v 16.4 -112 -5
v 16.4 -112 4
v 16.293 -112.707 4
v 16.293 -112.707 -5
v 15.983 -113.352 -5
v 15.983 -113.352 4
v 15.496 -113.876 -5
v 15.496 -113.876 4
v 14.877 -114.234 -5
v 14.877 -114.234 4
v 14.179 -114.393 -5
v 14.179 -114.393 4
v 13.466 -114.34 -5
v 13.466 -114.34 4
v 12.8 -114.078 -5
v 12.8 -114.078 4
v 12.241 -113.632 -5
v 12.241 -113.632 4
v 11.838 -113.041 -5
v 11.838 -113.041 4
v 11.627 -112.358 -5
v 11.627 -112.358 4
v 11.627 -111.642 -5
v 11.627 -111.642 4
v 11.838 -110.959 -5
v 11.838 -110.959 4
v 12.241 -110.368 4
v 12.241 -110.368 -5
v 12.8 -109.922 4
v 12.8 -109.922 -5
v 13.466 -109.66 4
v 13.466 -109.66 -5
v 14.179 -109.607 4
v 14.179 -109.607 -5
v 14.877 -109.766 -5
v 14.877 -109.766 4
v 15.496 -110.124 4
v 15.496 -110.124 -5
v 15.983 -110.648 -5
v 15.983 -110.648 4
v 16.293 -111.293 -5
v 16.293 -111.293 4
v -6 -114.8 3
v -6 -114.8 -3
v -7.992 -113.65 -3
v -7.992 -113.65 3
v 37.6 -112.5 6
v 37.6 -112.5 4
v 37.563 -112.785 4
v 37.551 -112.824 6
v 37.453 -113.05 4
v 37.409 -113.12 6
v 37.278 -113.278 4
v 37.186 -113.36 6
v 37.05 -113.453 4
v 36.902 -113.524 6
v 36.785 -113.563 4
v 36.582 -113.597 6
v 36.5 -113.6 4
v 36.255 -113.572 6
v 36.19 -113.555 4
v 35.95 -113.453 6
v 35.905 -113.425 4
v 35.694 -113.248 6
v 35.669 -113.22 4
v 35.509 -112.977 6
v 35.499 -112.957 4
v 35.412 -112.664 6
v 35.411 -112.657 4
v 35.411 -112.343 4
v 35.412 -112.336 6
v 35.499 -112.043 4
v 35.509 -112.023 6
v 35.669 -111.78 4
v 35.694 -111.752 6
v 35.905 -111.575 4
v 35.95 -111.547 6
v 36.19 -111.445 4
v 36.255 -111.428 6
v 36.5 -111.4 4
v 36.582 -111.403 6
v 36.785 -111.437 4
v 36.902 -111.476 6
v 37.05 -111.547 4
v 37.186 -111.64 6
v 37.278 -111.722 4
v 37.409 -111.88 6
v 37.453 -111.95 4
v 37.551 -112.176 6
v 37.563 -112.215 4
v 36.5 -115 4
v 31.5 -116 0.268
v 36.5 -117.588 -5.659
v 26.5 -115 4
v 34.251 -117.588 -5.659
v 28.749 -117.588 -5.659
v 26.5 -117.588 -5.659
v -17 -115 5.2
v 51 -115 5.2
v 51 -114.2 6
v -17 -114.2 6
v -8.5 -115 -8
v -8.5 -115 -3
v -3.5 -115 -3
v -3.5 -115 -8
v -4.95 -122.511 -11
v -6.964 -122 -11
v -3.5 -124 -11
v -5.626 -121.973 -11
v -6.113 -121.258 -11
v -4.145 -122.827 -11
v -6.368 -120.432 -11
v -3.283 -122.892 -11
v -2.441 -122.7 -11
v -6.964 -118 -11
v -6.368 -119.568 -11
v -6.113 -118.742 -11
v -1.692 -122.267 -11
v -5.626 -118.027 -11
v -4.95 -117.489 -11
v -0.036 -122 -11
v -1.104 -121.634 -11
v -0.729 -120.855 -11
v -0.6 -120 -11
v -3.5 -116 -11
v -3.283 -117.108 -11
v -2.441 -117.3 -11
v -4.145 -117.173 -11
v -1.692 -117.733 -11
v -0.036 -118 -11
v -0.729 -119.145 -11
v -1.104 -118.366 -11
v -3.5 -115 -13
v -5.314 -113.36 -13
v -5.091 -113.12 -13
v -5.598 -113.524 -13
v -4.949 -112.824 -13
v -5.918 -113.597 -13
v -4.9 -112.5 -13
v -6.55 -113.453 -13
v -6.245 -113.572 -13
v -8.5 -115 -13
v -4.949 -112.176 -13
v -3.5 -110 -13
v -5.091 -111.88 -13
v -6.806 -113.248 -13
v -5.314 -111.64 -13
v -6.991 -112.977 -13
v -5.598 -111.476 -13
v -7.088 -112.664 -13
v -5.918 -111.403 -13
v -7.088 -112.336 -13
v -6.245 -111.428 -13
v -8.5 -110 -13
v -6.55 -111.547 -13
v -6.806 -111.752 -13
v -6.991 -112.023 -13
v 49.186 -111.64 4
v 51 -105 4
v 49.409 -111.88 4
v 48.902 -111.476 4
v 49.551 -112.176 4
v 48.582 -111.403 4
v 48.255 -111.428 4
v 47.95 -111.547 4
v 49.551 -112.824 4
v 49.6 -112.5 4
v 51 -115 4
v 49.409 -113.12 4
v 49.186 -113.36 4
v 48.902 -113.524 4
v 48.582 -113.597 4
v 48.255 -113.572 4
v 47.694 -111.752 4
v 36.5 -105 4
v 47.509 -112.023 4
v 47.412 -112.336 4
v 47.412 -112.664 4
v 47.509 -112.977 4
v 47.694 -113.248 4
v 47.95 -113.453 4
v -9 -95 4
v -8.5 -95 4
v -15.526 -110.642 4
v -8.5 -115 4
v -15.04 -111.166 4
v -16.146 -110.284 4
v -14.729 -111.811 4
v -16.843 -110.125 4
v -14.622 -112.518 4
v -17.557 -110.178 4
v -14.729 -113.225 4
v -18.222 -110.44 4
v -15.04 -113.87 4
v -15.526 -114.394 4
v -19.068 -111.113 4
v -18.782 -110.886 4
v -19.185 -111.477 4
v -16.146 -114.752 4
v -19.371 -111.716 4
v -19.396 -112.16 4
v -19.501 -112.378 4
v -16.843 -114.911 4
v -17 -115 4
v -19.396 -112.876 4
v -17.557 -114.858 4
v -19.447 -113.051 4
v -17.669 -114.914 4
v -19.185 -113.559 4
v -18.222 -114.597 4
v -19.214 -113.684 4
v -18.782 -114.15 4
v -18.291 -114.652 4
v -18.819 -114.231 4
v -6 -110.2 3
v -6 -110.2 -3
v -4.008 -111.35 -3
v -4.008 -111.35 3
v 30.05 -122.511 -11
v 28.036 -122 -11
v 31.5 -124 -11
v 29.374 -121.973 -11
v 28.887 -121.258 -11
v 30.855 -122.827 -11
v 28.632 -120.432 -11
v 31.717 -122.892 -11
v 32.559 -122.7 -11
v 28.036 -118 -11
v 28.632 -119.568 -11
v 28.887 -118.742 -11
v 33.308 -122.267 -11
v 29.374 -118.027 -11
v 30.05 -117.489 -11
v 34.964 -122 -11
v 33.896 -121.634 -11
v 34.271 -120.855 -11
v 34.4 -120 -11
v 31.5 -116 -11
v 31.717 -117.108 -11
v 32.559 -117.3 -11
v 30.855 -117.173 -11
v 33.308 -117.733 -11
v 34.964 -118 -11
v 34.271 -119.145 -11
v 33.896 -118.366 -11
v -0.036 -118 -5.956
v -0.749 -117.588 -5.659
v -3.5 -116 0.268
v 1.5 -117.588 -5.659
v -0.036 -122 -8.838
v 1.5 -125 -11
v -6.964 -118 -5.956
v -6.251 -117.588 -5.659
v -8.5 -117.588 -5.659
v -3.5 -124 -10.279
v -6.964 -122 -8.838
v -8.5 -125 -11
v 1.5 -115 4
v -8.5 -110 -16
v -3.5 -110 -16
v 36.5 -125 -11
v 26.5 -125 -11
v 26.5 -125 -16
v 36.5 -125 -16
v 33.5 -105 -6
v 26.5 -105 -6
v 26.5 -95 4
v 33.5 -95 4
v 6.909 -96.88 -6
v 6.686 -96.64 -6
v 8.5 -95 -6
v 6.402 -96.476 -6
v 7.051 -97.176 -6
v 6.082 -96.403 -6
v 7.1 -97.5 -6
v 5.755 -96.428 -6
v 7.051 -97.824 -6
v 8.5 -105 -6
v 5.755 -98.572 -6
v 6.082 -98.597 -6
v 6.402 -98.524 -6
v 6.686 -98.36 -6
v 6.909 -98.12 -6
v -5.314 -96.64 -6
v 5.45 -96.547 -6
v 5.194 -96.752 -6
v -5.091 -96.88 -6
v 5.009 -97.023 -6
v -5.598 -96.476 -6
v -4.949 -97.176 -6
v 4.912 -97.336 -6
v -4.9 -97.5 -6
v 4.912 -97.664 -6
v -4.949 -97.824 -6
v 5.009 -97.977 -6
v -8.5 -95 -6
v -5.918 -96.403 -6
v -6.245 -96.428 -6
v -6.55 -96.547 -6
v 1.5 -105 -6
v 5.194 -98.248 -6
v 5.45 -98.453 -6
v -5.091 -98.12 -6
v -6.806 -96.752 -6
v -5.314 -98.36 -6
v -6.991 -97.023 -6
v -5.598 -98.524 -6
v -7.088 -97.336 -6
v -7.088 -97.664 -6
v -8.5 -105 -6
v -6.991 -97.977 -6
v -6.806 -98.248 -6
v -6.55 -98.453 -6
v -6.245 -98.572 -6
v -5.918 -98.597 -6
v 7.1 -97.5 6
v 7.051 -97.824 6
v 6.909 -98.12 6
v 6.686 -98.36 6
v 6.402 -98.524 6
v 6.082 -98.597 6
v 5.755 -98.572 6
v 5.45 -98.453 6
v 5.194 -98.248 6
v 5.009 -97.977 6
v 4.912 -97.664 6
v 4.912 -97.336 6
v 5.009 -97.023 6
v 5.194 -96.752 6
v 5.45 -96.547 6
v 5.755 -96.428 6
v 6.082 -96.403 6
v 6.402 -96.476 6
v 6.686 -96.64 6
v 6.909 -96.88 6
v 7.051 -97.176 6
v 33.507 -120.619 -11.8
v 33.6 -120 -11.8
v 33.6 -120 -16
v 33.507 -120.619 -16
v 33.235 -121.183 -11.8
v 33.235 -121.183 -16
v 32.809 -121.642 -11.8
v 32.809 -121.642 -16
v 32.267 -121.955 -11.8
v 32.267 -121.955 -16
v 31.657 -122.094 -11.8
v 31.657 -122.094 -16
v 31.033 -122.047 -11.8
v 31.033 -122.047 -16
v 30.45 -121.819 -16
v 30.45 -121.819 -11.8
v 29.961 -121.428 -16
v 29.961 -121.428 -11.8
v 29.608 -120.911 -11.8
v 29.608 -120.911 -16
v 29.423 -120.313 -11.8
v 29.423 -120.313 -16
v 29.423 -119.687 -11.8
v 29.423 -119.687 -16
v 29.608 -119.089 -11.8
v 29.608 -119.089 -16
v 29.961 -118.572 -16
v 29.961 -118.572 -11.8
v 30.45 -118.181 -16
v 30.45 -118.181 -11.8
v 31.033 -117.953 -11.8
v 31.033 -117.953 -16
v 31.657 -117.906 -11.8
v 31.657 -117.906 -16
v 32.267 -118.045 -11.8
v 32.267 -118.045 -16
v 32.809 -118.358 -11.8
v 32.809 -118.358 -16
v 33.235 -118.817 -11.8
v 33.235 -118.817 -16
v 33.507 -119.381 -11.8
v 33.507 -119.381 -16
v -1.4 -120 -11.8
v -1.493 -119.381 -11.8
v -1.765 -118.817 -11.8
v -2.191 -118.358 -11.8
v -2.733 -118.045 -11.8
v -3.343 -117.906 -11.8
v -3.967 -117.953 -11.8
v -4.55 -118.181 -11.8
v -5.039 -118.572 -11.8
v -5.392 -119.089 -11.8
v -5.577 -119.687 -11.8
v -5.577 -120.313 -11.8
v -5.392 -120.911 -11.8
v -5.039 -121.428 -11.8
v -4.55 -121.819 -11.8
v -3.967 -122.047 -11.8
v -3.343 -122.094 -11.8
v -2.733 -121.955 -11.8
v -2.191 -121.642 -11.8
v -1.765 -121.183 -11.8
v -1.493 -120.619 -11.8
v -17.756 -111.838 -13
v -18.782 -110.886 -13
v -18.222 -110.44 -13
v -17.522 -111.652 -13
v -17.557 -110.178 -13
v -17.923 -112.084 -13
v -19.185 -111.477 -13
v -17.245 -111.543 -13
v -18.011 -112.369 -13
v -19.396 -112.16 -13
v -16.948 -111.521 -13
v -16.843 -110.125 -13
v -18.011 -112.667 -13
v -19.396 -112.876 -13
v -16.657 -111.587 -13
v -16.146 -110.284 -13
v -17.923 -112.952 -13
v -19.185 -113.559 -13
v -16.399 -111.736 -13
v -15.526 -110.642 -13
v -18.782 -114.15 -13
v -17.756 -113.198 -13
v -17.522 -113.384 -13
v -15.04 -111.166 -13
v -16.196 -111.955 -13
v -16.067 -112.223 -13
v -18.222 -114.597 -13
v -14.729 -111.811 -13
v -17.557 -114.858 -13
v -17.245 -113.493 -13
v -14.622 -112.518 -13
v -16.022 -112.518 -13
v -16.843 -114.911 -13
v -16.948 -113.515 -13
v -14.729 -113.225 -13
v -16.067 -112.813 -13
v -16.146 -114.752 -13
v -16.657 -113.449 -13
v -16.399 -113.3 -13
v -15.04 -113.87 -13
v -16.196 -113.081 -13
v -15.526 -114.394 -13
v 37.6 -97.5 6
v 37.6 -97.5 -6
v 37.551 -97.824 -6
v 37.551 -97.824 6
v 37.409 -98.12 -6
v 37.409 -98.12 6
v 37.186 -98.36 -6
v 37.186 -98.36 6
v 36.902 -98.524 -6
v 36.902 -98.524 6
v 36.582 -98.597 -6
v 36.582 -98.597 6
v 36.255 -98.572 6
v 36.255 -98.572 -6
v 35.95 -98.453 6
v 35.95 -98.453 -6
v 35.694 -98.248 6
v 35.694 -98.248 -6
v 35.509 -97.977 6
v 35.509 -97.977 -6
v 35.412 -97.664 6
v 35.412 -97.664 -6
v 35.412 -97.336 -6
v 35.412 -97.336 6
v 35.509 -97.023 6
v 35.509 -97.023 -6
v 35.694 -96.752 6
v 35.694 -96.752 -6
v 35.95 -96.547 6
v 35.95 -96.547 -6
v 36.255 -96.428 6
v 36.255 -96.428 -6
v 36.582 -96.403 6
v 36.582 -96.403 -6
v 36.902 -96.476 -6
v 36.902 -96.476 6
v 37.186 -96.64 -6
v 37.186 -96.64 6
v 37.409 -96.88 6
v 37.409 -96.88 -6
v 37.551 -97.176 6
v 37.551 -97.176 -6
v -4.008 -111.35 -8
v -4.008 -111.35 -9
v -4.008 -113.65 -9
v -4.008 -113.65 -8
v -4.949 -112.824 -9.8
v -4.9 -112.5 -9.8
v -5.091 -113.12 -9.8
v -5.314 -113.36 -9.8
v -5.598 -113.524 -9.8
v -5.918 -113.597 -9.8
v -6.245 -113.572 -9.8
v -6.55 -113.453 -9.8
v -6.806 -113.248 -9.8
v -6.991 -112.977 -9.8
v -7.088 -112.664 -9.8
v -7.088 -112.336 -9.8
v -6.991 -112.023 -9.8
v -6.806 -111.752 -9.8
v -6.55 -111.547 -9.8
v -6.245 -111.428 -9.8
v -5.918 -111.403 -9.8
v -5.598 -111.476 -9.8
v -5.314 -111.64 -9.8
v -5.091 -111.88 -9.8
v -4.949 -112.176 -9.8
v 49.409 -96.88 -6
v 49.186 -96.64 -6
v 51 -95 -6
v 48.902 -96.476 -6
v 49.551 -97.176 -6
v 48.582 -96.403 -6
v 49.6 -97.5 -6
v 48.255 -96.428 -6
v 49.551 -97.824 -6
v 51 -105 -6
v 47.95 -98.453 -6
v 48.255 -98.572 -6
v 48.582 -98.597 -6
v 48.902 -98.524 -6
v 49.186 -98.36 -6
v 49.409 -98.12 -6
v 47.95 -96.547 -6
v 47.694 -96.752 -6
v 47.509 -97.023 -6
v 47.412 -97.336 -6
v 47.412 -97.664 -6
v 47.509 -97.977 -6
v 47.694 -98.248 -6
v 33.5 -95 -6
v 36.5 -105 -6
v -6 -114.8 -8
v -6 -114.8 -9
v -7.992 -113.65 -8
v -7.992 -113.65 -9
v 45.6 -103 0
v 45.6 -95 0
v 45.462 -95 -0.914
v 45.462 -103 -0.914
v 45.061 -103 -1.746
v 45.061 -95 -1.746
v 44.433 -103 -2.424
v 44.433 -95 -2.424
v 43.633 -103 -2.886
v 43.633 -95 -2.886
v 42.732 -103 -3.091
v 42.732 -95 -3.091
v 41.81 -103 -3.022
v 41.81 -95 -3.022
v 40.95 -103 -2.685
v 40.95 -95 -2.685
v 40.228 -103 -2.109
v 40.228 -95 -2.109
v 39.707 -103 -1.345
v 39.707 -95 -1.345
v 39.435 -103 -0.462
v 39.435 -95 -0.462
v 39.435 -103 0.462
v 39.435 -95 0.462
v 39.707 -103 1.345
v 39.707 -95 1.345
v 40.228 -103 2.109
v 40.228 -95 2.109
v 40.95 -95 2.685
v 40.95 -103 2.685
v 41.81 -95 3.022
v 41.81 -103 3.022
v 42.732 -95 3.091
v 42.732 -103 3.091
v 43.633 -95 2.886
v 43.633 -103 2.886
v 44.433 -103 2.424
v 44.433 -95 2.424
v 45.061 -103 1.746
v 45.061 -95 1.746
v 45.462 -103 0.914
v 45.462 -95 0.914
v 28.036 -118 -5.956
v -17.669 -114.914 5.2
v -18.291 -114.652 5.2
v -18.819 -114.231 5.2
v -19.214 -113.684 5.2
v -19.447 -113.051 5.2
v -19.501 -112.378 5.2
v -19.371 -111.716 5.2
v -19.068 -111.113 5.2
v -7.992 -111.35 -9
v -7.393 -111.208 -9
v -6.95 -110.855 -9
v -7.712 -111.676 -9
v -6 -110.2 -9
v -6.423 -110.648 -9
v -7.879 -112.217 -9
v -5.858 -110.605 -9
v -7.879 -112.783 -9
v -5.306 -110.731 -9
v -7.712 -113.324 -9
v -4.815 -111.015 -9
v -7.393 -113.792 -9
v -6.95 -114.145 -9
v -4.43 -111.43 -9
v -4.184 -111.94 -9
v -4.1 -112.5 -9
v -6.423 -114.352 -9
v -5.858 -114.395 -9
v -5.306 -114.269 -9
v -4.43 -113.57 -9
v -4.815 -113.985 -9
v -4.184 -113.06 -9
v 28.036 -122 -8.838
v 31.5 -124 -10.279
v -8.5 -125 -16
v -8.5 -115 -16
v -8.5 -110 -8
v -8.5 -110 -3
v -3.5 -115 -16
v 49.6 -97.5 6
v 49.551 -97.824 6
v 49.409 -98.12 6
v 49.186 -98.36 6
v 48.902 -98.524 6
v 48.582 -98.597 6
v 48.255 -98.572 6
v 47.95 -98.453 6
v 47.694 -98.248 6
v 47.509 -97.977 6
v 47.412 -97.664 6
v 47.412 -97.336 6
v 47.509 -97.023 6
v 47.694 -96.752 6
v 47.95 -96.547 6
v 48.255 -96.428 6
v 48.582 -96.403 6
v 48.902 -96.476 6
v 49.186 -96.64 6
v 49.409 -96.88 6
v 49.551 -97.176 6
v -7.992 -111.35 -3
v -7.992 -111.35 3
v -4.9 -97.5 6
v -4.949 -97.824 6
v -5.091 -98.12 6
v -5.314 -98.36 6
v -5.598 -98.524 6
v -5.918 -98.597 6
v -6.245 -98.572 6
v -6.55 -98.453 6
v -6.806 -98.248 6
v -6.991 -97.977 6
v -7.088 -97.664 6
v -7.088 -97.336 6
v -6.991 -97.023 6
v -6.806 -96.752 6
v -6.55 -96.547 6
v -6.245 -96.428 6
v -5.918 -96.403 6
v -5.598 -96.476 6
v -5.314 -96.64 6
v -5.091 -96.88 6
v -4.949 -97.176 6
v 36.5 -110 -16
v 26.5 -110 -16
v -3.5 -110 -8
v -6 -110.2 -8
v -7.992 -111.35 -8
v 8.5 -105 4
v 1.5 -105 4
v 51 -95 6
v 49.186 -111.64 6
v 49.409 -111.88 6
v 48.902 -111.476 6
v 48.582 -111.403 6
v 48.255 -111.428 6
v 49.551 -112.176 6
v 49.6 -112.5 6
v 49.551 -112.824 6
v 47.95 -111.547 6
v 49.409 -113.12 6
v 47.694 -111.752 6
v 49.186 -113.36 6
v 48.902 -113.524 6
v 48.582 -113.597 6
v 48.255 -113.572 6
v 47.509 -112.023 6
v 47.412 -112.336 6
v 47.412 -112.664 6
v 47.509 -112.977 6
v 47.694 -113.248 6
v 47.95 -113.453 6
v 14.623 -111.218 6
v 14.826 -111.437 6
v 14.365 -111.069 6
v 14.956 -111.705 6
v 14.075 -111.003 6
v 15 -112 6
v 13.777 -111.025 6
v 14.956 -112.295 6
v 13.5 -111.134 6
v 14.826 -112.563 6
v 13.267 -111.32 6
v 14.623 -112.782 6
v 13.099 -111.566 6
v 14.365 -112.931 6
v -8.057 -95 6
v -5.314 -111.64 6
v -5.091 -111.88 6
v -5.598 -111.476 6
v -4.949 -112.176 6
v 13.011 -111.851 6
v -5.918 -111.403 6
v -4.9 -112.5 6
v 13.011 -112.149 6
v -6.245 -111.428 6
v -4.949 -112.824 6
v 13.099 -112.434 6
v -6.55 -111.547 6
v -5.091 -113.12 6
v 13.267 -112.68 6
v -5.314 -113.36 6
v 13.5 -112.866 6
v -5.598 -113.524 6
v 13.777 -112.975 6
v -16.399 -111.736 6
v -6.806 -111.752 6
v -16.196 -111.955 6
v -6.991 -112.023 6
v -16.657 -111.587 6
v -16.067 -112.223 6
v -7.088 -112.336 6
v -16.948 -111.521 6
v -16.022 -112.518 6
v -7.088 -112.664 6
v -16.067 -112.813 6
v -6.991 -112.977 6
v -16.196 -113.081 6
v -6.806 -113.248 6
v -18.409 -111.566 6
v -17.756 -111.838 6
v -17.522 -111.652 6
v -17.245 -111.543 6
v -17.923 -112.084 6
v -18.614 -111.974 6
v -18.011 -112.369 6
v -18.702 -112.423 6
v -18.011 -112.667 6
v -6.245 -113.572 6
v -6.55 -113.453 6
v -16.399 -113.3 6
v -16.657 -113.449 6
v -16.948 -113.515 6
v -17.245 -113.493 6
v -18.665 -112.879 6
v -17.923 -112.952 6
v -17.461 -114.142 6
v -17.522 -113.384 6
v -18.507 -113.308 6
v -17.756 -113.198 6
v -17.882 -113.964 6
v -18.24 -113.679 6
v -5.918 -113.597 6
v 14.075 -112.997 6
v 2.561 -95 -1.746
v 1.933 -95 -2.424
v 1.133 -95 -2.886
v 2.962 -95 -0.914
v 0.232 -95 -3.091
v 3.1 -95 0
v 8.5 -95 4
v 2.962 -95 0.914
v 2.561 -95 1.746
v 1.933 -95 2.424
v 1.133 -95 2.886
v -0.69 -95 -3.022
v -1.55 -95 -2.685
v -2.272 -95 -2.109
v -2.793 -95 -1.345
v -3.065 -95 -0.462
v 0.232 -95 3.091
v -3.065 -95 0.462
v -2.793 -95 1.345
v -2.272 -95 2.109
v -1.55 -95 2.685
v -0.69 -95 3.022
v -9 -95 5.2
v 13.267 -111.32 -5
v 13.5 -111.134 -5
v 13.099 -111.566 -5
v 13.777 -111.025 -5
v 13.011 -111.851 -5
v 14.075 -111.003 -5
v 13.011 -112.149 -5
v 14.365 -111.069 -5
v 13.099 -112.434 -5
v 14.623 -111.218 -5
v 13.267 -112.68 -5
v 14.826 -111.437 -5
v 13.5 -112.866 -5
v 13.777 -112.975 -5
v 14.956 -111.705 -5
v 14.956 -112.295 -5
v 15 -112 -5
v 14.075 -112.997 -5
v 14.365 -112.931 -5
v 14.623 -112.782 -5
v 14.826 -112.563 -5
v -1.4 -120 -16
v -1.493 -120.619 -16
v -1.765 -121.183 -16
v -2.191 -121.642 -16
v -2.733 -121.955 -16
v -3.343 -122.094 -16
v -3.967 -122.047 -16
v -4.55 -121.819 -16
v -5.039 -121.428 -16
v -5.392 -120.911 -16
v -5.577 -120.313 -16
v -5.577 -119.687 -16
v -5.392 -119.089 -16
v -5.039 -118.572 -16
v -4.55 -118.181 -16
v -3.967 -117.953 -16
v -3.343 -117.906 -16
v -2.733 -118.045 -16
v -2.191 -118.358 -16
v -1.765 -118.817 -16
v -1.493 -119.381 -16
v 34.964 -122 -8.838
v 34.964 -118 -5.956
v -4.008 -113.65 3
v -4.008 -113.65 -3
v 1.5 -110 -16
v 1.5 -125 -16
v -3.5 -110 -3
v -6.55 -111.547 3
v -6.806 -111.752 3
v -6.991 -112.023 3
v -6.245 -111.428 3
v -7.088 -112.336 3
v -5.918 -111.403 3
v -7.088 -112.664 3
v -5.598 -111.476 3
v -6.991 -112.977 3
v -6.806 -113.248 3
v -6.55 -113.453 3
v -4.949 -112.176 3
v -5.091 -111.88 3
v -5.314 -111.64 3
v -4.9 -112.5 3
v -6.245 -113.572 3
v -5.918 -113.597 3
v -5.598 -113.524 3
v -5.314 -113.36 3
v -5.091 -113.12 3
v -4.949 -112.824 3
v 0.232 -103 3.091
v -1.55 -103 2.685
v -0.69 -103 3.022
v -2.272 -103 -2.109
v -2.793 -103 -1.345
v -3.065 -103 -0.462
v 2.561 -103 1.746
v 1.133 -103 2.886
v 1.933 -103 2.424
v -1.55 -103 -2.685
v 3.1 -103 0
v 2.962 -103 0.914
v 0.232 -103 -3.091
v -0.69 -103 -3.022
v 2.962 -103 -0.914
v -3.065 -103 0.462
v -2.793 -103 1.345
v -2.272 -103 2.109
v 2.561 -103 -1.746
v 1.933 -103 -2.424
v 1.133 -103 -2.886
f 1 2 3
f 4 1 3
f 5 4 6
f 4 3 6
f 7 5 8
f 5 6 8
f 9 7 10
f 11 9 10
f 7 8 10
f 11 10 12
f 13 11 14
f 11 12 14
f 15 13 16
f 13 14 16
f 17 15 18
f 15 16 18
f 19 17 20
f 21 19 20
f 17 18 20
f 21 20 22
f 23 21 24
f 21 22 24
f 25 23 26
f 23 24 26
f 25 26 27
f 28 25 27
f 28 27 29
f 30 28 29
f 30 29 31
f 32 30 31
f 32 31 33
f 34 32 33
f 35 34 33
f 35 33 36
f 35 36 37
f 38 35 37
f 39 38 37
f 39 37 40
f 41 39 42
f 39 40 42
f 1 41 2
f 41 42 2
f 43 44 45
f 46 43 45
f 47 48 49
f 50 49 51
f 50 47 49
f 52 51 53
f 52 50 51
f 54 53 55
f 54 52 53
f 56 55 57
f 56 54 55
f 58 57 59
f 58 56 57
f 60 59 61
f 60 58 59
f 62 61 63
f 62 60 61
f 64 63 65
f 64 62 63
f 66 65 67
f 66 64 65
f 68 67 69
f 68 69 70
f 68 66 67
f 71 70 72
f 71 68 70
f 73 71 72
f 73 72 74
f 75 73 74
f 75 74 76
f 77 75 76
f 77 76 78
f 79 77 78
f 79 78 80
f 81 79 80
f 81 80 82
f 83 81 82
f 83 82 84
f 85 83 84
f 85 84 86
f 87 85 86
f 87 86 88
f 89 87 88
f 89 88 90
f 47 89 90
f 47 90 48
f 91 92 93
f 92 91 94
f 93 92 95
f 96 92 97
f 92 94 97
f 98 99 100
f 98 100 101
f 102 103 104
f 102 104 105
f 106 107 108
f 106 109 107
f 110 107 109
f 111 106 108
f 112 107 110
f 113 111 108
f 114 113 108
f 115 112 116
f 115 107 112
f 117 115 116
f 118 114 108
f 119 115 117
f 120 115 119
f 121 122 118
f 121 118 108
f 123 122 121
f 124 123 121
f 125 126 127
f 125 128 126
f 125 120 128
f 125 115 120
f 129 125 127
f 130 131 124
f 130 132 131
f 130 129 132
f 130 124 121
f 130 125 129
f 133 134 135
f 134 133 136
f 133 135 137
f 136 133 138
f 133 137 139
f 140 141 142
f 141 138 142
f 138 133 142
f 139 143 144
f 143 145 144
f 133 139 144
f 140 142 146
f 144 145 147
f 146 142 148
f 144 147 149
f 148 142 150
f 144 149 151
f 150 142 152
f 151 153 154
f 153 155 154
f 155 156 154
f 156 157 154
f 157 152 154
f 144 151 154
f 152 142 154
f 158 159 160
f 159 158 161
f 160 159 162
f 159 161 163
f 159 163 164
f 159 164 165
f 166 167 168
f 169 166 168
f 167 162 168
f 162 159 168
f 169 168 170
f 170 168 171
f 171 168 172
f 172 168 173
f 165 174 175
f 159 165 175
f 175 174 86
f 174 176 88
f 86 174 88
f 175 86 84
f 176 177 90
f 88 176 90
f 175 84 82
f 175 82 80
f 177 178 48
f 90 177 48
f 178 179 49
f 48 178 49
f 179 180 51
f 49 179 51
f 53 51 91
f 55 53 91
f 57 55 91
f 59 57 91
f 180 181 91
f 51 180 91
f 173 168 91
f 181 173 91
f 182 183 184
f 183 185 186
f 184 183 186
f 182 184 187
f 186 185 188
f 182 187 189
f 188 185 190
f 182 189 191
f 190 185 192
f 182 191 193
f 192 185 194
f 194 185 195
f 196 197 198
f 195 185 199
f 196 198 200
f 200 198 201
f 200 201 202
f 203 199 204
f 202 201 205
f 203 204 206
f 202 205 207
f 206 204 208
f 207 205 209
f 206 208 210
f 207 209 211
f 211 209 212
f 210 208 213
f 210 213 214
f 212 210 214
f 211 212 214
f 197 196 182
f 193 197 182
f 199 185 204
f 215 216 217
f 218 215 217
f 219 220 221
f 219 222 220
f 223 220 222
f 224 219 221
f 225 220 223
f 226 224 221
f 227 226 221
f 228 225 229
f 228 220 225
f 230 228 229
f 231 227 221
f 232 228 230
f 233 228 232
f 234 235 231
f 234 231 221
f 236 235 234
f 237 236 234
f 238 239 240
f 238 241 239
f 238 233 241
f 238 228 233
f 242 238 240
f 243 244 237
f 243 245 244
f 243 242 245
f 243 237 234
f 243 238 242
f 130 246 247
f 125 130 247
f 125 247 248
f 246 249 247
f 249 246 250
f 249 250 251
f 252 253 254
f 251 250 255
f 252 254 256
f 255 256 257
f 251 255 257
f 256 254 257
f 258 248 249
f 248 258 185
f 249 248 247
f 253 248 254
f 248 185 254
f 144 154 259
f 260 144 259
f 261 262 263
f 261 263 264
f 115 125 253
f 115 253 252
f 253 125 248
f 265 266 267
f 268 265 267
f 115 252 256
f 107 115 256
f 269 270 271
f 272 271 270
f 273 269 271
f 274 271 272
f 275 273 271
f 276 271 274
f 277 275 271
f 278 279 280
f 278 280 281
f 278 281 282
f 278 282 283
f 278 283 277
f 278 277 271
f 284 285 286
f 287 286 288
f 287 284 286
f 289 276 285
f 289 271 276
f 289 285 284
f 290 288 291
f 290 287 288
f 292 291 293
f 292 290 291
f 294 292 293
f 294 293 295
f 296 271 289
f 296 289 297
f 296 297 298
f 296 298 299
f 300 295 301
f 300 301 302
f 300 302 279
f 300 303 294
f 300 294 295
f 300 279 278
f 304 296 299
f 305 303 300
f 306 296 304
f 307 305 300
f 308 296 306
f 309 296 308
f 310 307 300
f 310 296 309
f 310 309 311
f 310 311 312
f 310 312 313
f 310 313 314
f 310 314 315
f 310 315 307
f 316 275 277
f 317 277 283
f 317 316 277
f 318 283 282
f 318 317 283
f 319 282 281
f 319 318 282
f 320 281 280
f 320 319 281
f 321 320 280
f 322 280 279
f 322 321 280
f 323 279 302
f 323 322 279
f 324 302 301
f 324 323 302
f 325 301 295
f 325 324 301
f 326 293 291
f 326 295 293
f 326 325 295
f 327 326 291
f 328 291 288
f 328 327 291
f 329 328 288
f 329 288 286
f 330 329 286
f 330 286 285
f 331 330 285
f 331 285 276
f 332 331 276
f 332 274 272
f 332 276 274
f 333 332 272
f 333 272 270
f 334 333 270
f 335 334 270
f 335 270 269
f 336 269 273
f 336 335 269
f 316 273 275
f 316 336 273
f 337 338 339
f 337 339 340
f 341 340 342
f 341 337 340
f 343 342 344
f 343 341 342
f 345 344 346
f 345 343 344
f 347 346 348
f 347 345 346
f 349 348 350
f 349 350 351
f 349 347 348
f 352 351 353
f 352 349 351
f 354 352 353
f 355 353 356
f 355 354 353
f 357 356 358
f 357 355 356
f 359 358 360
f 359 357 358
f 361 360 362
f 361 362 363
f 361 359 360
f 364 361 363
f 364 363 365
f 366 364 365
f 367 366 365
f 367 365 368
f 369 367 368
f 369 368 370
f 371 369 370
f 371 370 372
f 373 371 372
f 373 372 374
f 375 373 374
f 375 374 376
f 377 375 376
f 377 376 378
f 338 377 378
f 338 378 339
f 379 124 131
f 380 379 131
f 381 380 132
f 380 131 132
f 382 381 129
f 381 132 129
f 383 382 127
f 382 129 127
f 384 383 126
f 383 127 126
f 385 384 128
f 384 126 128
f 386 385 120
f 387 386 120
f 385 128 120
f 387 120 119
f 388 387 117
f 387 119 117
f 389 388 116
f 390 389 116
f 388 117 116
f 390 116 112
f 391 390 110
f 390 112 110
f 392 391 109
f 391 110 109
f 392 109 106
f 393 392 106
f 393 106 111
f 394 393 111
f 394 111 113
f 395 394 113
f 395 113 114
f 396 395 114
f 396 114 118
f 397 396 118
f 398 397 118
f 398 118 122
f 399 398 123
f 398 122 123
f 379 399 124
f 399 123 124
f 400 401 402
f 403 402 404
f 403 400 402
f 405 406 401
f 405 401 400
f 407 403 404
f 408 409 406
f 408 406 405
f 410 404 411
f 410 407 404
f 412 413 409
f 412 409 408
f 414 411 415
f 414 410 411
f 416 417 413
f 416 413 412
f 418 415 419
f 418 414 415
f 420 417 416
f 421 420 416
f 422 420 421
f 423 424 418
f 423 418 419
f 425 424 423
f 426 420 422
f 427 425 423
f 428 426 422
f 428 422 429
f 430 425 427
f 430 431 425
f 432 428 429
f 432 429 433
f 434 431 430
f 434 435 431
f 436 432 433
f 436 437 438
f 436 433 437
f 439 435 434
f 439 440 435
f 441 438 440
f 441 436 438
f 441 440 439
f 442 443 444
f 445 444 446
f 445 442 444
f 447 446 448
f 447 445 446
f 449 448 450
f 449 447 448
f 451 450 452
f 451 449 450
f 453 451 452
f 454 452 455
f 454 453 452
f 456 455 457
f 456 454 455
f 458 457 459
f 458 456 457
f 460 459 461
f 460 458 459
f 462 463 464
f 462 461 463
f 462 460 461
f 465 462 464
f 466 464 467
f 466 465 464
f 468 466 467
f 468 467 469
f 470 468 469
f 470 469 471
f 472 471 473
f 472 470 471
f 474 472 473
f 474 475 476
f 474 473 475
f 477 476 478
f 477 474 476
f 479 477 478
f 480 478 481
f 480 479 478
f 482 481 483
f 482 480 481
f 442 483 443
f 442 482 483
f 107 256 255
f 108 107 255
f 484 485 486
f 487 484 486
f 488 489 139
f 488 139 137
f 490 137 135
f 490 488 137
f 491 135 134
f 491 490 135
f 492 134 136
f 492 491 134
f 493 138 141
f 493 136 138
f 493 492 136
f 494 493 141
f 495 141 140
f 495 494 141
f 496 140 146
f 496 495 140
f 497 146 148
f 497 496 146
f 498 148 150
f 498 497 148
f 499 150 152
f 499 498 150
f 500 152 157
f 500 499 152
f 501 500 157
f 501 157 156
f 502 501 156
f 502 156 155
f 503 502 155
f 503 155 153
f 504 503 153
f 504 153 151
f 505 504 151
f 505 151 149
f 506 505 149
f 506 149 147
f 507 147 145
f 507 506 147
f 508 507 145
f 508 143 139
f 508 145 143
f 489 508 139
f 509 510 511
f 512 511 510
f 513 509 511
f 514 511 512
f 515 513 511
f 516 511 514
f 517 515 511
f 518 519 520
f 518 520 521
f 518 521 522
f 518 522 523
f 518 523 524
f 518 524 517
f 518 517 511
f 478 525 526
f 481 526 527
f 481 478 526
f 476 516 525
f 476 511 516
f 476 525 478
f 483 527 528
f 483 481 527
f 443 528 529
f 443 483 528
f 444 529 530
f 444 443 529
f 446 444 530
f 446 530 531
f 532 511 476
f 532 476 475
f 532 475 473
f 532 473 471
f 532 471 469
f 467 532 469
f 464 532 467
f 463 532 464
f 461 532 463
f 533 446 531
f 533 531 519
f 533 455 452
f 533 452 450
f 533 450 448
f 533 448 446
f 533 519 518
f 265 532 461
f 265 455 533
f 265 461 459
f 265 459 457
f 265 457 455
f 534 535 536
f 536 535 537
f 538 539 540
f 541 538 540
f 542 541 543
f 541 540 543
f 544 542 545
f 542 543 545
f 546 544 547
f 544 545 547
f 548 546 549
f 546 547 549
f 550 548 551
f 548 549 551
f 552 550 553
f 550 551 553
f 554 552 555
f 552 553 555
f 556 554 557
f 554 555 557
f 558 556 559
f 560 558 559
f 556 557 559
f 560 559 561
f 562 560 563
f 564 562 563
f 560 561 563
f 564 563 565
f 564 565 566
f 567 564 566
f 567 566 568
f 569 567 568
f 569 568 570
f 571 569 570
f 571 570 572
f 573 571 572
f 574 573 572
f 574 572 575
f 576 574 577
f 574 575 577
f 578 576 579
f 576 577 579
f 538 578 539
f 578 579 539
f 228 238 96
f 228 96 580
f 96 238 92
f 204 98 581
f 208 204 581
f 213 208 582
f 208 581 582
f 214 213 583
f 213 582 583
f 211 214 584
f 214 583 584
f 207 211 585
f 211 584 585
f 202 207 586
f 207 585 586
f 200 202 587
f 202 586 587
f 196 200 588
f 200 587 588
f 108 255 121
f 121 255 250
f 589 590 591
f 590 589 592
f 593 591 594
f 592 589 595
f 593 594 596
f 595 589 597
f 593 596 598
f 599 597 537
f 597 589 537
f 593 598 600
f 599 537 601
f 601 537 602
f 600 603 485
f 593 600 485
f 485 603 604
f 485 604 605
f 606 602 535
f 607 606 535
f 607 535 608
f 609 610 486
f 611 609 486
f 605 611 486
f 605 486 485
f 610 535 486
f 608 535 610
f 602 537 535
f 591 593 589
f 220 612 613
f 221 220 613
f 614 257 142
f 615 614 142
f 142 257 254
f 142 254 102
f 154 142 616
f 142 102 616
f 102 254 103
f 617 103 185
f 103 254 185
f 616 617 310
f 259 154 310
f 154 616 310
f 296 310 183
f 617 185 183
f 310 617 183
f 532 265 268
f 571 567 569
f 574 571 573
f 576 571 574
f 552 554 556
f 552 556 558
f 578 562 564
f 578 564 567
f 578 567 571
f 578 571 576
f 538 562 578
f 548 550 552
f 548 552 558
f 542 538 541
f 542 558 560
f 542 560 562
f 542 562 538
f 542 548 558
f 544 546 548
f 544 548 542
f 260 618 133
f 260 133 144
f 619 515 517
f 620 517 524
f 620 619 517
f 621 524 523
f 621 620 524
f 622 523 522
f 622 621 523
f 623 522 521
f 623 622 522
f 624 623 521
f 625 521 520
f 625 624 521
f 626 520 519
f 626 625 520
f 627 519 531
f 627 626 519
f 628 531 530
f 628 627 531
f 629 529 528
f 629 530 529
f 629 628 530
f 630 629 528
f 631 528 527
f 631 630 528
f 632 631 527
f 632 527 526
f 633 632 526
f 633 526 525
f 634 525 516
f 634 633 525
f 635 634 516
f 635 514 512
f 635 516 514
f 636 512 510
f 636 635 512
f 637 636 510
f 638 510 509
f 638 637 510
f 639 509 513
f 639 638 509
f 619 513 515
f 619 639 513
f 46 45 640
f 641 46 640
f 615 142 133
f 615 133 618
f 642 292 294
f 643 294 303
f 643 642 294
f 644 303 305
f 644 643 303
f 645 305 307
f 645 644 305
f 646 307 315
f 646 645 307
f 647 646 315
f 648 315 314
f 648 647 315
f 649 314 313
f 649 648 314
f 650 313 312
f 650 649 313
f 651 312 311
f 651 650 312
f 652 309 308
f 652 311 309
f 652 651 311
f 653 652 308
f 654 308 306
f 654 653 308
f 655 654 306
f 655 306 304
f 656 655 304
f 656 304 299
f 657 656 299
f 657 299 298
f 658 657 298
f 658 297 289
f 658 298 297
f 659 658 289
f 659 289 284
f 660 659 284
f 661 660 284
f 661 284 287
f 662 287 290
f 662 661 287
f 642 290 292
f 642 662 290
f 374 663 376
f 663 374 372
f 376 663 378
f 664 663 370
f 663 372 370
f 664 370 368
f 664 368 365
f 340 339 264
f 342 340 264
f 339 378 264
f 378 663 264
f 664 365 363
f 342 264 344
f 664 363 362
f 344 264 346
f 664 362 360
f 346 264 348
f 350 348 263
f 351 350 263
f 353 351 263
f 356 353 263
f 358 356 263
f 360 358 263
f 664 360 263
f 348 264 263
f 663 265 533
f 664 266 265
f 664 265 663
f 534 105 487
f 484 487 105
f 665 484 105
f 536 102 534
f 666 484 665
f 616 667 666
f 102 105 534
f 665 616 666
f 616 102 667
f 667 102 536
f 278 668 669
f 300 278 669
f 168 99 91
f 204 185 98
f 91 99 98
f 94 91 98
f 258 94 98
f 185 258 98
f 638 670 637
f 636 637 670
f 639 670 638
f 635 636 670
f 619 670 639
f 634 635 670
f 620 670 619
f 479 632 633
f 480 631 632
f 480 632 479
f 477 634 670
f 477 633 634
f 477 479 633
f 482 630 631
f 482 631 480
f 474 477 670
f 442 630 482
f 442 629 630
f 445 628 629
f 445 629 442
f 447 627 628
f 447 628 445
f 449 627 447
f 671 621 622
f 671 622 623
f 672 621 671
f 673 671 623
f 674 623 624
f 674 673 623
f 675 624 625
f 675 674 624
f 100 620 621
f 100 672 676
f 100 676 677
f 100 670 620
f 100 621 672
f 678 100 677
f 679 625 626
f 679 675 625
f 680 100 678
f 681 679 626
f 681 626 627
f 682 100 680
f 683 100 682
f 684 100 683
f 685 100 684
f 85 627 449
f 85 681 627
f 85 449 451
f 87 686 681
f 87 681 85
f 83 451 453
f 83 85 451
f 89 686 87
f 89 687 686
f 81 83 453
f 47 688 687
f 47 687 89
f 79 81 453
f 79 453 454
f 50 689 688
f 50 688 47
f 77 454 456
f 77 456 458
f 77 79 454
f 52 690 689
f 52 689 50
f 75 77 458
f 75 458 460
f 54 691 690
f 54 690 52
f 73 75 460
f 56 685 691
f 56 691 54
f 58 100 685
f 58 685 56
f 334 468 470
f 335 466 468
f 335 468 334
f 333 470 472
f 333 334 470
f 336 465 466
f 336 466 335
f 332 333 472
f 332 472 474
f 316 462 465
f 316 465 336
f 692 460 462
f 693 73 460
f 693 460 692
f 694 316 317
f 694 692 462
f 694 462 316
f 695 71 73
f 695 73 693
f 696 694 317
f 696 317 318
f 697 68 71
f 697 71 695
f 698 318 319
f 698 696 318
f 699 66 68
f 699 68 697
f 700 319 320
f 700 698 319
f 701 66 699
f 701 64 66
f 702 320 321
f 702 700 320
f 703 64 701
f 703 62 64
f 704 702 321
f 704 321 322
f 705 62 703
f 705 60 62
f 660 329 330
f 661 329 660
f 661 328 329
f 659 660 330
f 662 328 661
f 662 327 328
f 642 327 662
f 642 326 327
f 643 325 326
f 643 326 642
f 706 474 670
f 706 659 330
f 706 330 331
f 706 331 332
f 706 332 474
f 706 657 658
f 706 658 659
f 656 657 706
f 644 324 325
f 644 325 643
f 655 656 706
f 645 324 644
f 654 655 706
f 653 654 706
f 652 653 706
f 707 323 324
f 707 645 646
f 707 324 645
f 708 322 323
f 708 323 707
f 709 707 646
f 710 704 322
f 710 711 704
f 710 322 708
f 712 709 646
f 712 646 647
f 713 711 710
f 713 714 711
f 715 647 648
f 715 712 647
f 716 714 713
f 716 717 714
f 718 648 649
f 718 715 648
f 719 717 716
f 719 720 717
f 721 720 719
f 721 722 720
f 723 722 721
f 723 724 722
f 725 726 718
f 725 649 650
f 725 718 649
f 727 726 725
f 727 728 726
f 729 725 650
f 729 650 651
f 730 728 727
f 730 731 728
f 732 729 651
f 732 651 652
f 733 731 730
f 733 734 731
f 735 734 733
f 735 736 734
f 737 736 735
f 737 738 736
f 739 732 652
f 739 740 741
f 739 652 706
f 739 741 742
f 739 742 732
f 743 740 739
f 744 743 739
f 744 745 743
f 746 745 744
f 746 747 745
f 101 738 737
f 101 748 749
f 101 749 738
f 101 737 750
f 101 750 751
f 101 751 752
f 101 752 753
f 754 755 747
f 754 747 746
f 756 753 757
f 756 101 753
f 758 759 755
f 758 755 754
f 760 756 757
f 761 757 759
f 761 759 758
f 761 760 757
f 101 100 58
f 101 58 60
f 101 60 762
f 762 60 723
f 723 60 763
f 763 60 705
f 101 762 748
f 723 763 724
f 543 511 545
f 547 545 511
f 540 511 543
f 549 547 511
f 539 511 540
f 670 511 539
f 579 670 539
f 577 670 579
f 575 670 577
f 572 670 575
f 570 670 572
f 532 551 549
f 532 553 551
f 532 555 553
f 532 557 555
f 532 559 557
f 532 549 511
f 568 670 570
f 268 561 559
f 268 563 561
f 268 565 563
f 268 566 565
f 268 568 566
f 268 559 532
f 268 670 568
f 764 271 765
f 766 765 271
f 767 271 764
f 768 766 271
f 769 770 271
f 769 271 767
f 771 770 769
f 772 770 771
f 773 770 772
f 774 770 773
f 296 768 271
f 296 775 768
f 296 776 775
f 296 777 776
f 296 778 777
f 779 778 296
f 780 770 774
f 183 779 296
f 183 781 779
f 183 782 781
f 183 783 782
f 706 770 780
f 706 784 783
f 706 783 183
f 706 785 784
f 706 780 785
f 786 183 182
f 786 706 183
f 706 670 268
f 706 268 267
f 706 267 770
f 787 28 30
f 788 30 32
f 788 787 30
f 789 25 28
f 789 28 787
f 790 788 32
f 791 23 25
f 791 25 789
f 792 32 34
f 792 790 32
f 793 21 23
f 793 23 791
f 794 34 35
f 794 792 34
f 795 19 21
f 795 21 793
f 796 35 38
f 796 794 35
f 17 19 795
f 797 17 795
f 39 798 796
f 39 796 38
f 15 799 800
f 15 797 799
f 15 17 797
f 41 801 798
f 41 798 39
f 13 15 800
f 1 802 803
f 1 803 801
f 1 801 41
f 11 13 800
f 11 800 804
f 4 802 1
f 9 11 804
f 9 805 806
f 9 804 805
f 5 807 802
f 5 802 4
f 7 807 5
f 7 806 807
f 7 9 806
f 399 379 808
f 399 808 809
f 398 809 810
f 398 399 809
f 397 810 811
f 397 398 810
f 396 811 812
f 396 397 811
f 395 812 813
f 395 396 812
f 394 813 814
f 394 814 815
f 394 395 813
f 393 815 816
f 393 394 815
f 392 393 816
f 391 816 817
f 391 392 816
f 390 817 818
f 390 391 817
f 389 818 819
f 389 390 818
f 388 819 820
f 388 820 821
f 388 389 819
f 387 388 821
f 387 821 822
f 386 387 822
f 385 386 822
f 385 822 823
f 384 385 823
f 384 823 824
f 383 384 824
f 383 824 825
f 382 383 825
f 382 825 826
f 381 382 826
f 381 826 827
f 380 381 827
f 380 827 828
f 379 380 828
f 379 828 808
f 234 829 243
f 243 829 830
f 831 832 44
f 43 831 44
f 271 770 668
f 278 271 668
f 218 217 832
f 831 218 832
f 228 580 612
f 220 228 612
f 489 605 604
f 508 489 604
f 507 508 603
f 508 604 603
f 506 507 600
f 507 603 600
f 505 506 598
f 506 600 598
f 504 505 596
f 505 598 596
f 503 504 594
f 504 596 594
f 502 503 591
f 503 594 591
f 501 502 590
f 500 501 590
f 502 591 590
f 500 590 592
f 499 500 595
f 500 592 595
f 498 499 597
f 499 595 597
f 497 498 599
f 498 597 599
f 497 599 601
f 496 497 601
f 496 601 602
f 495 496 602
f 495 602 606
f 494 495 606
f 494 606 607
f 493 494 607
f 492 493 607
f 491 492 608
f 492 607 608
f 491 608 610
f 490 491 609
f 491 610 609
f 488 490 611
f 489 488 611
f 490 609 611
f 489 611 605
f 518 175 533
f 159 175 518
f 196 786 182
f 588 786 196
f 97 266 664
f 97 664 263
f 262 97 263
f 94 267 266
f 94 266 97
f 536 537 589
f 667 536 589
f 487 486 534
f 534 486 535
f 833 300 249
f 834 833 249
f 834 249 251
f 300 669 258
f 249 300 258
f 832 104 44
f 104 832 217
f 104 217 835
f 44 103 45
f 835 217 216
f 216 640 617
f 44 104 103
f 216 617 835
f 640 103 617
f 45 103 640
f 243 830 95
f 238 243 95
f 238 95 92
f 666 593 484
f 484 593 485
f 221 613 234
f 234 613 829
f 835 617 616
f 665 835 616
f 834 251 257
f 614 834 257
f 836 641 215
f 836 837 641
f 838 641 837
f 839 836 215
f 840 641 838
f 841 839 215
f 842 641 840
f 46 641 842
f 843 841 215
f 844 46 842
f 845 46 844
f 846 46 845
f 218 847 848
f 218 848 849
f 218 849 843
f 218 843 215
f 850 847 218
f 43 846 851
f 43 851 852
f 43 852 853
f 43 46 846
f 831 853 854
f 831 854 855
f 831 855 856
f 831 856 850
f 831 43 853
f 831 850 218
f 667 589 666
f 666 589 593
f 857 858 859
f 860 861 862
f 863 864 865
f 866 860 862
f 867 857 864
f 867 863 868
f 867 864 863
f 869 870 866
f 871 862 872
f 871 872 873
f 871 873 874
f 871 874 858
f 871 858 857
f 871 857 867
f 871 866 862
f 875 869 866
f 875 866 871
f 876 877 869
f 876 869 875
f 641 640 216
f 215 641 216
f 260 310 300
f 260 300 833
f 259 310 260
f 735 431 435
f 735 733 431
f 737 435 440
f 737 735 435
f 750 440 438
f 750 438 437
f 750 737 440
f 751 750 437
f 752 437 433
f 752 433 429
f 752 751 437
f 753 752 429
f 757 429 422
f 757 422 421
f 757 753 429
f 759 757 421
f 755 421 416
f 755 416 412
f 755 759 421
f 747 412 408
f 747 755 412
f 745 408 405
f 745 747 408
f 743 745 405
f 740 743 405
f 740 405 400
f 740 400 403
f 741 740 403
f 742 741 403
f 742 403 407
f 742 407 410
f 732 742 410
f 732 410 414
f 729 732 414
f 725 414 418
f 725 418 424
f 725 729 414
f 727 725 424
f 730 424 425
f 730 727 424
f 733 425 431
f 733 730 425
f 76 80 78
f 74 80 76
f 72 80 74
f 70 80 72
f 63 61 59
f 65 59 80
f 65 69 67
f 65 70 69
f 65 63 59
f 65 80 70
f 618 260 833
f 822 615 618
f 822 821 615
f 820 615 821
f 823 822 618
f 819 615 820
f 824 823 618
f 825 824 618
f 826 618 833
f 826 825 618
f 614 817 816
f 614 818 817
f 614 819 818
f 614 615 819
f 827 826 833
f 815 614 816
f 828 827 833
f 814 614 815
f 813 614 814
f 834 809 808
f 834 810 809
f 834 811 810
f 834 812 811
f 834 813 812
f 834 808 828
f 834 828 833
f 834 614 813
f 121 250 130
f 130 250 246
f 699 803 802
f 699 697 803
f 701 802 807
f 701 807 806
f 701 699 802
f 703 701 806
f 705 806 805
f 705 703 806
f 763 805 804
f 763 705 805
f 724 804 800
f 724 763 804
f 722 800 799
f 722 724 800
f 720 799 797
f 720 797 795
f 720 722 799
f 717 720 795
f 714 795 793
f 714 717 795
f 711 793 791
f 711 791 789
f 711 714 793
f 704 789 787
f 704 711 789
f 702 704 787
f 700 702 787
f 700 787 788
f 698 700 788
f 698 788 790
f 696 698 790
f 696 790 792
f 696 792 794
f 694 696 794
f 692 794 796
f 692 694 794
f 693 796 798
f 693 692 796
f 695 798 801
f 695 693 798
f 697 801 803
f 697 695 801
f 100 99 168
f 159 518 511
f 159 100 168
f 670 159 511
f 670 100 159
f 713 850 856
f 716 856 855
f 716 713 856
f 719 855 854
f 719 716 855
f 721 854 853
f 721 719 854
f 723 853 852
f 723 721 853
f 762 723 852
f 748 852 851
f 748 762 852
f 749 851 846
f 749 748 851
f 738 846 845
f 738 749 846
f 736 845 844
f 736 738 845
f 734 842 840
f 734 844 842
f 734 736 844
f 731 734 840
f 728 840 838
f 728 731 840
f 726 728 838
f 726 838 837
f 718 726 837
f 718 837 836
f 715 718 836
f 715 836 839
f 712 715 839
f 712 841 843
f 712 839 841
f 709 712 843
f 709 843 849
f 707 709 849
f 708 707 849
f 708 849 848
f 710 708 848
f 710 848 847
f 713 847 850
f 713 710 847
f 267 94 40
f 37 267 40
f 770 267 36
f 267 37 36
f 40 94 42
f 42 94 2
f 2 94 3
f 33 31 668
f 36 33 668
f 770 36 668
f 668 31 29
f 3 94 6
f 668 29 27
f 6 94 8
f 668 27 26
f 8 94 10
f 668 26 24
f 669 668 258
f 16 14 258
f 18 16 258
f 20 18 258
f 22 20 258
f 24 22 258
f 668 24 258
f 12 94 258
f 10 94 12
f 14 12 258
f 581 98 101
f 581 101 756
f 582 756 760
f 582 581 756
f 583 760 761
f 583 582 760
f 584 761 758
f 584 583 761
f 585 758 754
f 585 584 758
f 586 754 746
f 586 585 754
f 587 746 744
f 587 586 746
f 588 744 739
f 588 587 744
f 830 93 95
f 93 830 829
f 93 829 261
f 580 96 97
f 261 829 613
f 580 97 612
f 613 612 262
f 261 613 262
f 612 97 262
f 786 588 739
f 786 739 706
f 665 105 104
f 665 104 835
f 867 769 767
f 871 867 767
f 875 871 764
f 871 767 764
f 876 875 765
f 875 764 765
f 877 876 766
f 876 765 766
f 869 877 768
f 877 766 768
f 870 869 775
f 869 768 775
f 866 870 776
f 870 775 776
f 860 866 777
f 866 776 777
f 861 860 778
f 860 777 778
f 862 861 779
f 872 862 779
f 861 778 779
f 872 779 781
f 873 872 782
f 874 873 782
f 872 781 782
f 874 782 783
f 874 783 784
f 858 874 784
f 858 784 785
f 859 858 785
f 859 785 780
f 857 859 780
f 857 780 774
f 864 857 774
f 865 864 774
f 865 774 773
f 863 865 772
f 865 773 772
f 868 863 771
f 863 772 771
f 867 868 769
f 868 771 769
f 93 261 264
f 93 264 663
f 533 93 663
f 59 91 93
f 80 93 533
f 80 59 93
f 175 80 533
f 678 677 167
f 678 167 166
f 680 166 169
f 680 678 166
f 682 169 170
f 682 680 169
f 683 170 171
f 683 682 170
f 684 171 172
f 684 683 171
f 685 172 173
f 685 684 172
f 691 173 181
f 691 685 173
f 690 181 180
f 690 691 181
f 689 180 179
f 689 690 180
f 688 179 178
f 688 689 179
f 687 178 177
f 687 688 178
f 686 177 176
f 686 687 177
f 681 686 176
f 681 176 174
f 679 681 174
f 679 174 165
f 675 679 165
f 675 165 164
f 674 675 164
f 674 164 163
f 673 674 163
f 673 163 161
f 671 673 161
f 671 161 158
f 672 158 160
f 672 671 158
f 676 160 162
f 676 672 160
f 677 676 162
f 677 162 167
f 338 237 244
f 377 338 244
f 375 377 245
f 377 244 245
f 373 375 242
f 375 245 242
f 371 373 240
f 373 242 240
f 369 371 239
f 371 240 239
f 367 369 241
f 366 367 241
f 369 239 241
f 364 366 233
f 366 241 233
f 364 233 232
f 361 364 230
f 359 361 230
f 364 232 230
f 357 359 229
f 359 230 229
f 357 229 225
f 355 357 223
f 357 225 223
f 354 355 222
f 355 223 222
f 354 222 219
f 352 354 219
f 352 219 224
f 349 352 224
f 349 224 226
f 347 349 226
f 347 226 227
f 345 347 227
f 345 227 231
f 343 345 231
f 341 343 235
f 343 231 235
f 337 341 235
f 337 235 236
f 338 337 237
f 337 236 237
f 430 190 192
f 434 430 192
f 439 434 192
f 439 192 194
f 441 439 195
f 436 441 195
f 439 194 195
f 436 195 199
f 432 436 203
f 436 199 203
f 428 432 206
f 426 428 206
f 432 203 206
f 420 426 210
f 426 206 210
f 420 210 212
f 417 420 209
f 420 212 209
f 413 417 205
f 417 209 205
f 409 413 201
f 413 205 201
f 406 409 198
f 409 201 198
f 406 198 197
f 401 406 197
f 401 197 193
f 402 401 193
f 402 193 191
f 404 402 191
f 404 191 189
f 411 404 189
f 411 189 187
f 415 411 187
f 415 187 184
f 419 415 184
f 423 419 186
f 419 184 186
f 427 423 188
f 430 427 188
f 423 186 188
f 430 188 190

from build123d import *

# Parameters (mm, degrees)
SKETCH062_R     = 1.1
SKETCH062_R_2   = 1
PAD027_DEPTH    = 2
SKETCH063_R     = 2.4
SKETCH063_R_2   = 1
PAD028_DEPTH    = 17
SKETCH064_R     = 2.4
SKETCH064_R_2   = 1
PAD029_DEPTH    = 9
SKETCH065_R     = 2.1
SKETCH065_R_2   = 1.1
PAD030_DEPTH    = 20
POCKET029_DEPTH = 15
POCKET030_DEPTH = 59.501
SKETCH068_W     = 5
SKETCH068_H     = 3
SKETCH068_H_2   = 5
POCKET031_DEPTH = 5
SKETCH069_R     = 3.1
POCKET032_DEPTH = 8
POCKET033_DEPTH = 6
POCKET034_DEPTH = 7
CHAMFER004_SIZE = 0.8


with BuildPart() as part:
    # Sketch062 → Pad027 (new body)
    with BuildSketch(Plane(origin=(51, -95, 6), x_dir=(1, 0, 0), z_dir=(0, 0, -1))):
        with BuildLine():
            Line((0, 0), (-60, 0))
            Line((-60, 0), (-70.068466, 16.112914))
            ThreePointArc((-68, 20), (-70.213604, 18.684045), (-70.068466, 16.112914))
            Line((0, 20), (-68, 20))
            Line((0, 0), (0, 20))
        make_face()
        with Locations((-2.5, 2.5)):
            Circle(SKETCH062_R, mode=Mode.SUBTRACT)
        with Locations((-2.5, 17.5)):
            Circle(SKETCH062_R, mode=Mode.SUBTRACT)
        with Locations((-14.5, 17.5)):
            Circle(SKETCH062_R, mode=Mode.SUBTRACT)
        with Locations((-14.5, 2.5)):
            Circle(SKETCH062_R, mode=Mode.SUBTRACT)
        with Locations((-45, 2.5)):
            Circle(SKETCH062_R, mode=Mode.SUBTRACT)
        with Locations((-57, 2.5)):
            Circle(SKETCH062_R, mode=Mode.SUBTRACT)
        with Locations((-57, 17.5)):
            Circle(SKETCH062_R, mode=Mode.SUBTRACT)
        with Locations((-68.022489, 17.518069)):
            Circle(SKETCH062_R_2, mode=Mode.SUBTRACT)
        with Locations((-37, 17)):
            Circle(SKETCH062_R_2, mode=Mode.SUBTRACT)
    extrude(amount=PAD027_DEPTH)

    # Sketch063 → Pad028 (new body)
    with BuildSketch(Plane(origin=(51, -95, 4), x_dir=(1, 0, 0), z_dir=(0, 0, -1))):
        with Locations((-68.022489, 17.518069)):
            Circle(SKETCH063_R)
        with Locations((-68.022489, 17.518069)):
            Circle(SKETCH063_R_2, mode=Mode.SUBTRACT)
    extrude(amount=PAD028_DEPTH)

    # Sketch064 → Pad029 (new body)
    with BuildSketch(Plane(origin=(51, -95, 4), x_dir=(1, 0, 0), z_dir=(0, 0, -1))):
        with Locations((-37, 17)):
            Circle(SKETCH064_R)
        with Locations((-37, 17)):
            Circle(SKETCH064_R_2, mode=Mode.SUBTRACT)
    extrude(amount=PAD029_DEPTH)

    # Sketch065 → Pad030 (new body)
    with BuildSketch(Plane(origin=(51, -95, 4), x_dir=(1, 0, 0), z_dir=(0, 0, -1))):
        Polygon((0, 0), (-24.5, 0), (-24.5, 30), (-14.5, 30), (-14.5, 10), (0, 10), align=None)
        with Locations((-19.5, 25)):
            Circle(SKETCH065_R, mode=Mode.SUBTRACT)
        with Locations((-14.5, 2.5)):
            Circle(SKETCH065_R_2, mode=Mode.SUBTRACT)
        with Locations((-2.5, 2.5)):
            Circle(SKETCH065_R_2, mode=Mode.SUBTRACT)
        Polygon((-59.5, 0), (-42.5, 0), (-42.5, 10), (-49.5, 10), (-49.5, 30), (-59.5, 30), align=None)
        with Locations((-54.5, 25)):
            Circle(SKETCH065_R, mode=Mode.SUBTRACT)
        with Locations((-57, 2.5)):
            Circle(SKETCH065_R_2, mode=Mode.SUBTRACT)
        with Locations((-45, 2.5)):
            Circle(SKETCH065_R_2, mode=Mode.SUBTRACT)
        with Locations((-57, 17.5)):
            Circle(SKETCH065_R_2, mode=Mode.SUBTRACT)
    extrude(amount=PAD030_DEPTH)

    # Sketch066 → Pocket029 (cut)
    with BuildSketch(Plane(origin=(51, -95, 4), x_dir=(1, 0, 0), z_dir=(0, 0, 1))):
        Polygon((-51.035898, -27), (-51.035898, -23), (-54.5, -21), (-57.964102, -23), (-57.964102, -27), (-54.5, -29), align=None)
        Polygon((-16.035898, -27), (-16.035898, -23), (-19.5, -21), (-22.964102, -23), (-22.964102, -27), (-19.5, -29), align=None)
    extrude(amount=-POCKET029_DEPTH, mode=Mode.SUBTRACT)

    # Sketch067 → Pocket030 (cut, through all)
    with BuildSketch(Plane(origin=(-8.5, -95, 6), x_dir=(0, 1, 0), z_dir=(-1, 0, 0))):
        Polygon((-22.58819, 11.659258), (-30, 17), (-30, 2), (-20, 2), align=None)
        Polygon((0, 22), (0, 12), (-10, 12), (-15, 22), align=None)
    extrude(amount=-POCKET030_DEPTH, mode=Mode.SUBTRACT)

    # Sketch068 → Pocket031 (cut)
    with BuildSketch(Plane(origin=(-8.5, -95, 6), x_dir=(0, 1, 0), z_dir=(-1, 0, 0))):
        with Locations((-17.5, 20.5)):
            Rectangle(SKETCH068_W, SKETCH068_H)
        with Locations((-17.5, 11.5)):
            Rectangle(SKETCH068_W, SKETCH068_H_2)
    extrude(amount=-POCKET031_DEPTH, mode=Mode.SUBTRACT)

    # Sketch069 → Pocket032 (cut)
    with BuildSketch(Plane(origin=(51, -95, 6), x_dir=(1, 0, 0), z_dir=(0, 1, 0))):
        with Locations((-8.5, 6)):
            Circle(SKETCH069_R)
        with Locations((-51, 6)):
            Circle(SKETCH069_R)
    extrude(amount=-POCKET032_DEPTH, mode=Mode.SUBTRACT)

    # Sketch070 → Pocket033 (cut, symmetric)
    with BuildSketch(Plane(origin=(51, -95, -3), x_dir=(1, 0, 0), z_dir=(0, 0, -1))):
        Polygon((-55.008142, 16.35), (-55.008142, 18.65), (-57, 19.8), (-58.991858, 18.65), (-58.991858, 16.35), (-57, 15.2), align=None)
    extrude(amount=POCKET033_DEPTH, both=True, mode=Mode.SUBTRACT)

    # Sketch071 → Pocket034 (cut)
    with BuildSketch(Plane(origin=(26.5, -95, 6), x_dir=(0, 1, 0), z_dir=(-1, 0, 0))):
        Polygon((-10, 12), (0, 2), (0, 12), align=None)
    extrude(amount=-POCKET034_DEPTH, mode=Mode.SUBTRACT)

    # Chamfer004
    chamfer004_edges = [part.edges().sort_by_distance(p)[0] for p in [
        (17, -115, 6),
        (29.4, -120, -11),
        (-5.6, -120, -11),
        (-7.1, -112.5, -9),
    ]]
    chamfer(chamfer004_edges, length=CHAMFER004_SIZE)


solid = part.part
